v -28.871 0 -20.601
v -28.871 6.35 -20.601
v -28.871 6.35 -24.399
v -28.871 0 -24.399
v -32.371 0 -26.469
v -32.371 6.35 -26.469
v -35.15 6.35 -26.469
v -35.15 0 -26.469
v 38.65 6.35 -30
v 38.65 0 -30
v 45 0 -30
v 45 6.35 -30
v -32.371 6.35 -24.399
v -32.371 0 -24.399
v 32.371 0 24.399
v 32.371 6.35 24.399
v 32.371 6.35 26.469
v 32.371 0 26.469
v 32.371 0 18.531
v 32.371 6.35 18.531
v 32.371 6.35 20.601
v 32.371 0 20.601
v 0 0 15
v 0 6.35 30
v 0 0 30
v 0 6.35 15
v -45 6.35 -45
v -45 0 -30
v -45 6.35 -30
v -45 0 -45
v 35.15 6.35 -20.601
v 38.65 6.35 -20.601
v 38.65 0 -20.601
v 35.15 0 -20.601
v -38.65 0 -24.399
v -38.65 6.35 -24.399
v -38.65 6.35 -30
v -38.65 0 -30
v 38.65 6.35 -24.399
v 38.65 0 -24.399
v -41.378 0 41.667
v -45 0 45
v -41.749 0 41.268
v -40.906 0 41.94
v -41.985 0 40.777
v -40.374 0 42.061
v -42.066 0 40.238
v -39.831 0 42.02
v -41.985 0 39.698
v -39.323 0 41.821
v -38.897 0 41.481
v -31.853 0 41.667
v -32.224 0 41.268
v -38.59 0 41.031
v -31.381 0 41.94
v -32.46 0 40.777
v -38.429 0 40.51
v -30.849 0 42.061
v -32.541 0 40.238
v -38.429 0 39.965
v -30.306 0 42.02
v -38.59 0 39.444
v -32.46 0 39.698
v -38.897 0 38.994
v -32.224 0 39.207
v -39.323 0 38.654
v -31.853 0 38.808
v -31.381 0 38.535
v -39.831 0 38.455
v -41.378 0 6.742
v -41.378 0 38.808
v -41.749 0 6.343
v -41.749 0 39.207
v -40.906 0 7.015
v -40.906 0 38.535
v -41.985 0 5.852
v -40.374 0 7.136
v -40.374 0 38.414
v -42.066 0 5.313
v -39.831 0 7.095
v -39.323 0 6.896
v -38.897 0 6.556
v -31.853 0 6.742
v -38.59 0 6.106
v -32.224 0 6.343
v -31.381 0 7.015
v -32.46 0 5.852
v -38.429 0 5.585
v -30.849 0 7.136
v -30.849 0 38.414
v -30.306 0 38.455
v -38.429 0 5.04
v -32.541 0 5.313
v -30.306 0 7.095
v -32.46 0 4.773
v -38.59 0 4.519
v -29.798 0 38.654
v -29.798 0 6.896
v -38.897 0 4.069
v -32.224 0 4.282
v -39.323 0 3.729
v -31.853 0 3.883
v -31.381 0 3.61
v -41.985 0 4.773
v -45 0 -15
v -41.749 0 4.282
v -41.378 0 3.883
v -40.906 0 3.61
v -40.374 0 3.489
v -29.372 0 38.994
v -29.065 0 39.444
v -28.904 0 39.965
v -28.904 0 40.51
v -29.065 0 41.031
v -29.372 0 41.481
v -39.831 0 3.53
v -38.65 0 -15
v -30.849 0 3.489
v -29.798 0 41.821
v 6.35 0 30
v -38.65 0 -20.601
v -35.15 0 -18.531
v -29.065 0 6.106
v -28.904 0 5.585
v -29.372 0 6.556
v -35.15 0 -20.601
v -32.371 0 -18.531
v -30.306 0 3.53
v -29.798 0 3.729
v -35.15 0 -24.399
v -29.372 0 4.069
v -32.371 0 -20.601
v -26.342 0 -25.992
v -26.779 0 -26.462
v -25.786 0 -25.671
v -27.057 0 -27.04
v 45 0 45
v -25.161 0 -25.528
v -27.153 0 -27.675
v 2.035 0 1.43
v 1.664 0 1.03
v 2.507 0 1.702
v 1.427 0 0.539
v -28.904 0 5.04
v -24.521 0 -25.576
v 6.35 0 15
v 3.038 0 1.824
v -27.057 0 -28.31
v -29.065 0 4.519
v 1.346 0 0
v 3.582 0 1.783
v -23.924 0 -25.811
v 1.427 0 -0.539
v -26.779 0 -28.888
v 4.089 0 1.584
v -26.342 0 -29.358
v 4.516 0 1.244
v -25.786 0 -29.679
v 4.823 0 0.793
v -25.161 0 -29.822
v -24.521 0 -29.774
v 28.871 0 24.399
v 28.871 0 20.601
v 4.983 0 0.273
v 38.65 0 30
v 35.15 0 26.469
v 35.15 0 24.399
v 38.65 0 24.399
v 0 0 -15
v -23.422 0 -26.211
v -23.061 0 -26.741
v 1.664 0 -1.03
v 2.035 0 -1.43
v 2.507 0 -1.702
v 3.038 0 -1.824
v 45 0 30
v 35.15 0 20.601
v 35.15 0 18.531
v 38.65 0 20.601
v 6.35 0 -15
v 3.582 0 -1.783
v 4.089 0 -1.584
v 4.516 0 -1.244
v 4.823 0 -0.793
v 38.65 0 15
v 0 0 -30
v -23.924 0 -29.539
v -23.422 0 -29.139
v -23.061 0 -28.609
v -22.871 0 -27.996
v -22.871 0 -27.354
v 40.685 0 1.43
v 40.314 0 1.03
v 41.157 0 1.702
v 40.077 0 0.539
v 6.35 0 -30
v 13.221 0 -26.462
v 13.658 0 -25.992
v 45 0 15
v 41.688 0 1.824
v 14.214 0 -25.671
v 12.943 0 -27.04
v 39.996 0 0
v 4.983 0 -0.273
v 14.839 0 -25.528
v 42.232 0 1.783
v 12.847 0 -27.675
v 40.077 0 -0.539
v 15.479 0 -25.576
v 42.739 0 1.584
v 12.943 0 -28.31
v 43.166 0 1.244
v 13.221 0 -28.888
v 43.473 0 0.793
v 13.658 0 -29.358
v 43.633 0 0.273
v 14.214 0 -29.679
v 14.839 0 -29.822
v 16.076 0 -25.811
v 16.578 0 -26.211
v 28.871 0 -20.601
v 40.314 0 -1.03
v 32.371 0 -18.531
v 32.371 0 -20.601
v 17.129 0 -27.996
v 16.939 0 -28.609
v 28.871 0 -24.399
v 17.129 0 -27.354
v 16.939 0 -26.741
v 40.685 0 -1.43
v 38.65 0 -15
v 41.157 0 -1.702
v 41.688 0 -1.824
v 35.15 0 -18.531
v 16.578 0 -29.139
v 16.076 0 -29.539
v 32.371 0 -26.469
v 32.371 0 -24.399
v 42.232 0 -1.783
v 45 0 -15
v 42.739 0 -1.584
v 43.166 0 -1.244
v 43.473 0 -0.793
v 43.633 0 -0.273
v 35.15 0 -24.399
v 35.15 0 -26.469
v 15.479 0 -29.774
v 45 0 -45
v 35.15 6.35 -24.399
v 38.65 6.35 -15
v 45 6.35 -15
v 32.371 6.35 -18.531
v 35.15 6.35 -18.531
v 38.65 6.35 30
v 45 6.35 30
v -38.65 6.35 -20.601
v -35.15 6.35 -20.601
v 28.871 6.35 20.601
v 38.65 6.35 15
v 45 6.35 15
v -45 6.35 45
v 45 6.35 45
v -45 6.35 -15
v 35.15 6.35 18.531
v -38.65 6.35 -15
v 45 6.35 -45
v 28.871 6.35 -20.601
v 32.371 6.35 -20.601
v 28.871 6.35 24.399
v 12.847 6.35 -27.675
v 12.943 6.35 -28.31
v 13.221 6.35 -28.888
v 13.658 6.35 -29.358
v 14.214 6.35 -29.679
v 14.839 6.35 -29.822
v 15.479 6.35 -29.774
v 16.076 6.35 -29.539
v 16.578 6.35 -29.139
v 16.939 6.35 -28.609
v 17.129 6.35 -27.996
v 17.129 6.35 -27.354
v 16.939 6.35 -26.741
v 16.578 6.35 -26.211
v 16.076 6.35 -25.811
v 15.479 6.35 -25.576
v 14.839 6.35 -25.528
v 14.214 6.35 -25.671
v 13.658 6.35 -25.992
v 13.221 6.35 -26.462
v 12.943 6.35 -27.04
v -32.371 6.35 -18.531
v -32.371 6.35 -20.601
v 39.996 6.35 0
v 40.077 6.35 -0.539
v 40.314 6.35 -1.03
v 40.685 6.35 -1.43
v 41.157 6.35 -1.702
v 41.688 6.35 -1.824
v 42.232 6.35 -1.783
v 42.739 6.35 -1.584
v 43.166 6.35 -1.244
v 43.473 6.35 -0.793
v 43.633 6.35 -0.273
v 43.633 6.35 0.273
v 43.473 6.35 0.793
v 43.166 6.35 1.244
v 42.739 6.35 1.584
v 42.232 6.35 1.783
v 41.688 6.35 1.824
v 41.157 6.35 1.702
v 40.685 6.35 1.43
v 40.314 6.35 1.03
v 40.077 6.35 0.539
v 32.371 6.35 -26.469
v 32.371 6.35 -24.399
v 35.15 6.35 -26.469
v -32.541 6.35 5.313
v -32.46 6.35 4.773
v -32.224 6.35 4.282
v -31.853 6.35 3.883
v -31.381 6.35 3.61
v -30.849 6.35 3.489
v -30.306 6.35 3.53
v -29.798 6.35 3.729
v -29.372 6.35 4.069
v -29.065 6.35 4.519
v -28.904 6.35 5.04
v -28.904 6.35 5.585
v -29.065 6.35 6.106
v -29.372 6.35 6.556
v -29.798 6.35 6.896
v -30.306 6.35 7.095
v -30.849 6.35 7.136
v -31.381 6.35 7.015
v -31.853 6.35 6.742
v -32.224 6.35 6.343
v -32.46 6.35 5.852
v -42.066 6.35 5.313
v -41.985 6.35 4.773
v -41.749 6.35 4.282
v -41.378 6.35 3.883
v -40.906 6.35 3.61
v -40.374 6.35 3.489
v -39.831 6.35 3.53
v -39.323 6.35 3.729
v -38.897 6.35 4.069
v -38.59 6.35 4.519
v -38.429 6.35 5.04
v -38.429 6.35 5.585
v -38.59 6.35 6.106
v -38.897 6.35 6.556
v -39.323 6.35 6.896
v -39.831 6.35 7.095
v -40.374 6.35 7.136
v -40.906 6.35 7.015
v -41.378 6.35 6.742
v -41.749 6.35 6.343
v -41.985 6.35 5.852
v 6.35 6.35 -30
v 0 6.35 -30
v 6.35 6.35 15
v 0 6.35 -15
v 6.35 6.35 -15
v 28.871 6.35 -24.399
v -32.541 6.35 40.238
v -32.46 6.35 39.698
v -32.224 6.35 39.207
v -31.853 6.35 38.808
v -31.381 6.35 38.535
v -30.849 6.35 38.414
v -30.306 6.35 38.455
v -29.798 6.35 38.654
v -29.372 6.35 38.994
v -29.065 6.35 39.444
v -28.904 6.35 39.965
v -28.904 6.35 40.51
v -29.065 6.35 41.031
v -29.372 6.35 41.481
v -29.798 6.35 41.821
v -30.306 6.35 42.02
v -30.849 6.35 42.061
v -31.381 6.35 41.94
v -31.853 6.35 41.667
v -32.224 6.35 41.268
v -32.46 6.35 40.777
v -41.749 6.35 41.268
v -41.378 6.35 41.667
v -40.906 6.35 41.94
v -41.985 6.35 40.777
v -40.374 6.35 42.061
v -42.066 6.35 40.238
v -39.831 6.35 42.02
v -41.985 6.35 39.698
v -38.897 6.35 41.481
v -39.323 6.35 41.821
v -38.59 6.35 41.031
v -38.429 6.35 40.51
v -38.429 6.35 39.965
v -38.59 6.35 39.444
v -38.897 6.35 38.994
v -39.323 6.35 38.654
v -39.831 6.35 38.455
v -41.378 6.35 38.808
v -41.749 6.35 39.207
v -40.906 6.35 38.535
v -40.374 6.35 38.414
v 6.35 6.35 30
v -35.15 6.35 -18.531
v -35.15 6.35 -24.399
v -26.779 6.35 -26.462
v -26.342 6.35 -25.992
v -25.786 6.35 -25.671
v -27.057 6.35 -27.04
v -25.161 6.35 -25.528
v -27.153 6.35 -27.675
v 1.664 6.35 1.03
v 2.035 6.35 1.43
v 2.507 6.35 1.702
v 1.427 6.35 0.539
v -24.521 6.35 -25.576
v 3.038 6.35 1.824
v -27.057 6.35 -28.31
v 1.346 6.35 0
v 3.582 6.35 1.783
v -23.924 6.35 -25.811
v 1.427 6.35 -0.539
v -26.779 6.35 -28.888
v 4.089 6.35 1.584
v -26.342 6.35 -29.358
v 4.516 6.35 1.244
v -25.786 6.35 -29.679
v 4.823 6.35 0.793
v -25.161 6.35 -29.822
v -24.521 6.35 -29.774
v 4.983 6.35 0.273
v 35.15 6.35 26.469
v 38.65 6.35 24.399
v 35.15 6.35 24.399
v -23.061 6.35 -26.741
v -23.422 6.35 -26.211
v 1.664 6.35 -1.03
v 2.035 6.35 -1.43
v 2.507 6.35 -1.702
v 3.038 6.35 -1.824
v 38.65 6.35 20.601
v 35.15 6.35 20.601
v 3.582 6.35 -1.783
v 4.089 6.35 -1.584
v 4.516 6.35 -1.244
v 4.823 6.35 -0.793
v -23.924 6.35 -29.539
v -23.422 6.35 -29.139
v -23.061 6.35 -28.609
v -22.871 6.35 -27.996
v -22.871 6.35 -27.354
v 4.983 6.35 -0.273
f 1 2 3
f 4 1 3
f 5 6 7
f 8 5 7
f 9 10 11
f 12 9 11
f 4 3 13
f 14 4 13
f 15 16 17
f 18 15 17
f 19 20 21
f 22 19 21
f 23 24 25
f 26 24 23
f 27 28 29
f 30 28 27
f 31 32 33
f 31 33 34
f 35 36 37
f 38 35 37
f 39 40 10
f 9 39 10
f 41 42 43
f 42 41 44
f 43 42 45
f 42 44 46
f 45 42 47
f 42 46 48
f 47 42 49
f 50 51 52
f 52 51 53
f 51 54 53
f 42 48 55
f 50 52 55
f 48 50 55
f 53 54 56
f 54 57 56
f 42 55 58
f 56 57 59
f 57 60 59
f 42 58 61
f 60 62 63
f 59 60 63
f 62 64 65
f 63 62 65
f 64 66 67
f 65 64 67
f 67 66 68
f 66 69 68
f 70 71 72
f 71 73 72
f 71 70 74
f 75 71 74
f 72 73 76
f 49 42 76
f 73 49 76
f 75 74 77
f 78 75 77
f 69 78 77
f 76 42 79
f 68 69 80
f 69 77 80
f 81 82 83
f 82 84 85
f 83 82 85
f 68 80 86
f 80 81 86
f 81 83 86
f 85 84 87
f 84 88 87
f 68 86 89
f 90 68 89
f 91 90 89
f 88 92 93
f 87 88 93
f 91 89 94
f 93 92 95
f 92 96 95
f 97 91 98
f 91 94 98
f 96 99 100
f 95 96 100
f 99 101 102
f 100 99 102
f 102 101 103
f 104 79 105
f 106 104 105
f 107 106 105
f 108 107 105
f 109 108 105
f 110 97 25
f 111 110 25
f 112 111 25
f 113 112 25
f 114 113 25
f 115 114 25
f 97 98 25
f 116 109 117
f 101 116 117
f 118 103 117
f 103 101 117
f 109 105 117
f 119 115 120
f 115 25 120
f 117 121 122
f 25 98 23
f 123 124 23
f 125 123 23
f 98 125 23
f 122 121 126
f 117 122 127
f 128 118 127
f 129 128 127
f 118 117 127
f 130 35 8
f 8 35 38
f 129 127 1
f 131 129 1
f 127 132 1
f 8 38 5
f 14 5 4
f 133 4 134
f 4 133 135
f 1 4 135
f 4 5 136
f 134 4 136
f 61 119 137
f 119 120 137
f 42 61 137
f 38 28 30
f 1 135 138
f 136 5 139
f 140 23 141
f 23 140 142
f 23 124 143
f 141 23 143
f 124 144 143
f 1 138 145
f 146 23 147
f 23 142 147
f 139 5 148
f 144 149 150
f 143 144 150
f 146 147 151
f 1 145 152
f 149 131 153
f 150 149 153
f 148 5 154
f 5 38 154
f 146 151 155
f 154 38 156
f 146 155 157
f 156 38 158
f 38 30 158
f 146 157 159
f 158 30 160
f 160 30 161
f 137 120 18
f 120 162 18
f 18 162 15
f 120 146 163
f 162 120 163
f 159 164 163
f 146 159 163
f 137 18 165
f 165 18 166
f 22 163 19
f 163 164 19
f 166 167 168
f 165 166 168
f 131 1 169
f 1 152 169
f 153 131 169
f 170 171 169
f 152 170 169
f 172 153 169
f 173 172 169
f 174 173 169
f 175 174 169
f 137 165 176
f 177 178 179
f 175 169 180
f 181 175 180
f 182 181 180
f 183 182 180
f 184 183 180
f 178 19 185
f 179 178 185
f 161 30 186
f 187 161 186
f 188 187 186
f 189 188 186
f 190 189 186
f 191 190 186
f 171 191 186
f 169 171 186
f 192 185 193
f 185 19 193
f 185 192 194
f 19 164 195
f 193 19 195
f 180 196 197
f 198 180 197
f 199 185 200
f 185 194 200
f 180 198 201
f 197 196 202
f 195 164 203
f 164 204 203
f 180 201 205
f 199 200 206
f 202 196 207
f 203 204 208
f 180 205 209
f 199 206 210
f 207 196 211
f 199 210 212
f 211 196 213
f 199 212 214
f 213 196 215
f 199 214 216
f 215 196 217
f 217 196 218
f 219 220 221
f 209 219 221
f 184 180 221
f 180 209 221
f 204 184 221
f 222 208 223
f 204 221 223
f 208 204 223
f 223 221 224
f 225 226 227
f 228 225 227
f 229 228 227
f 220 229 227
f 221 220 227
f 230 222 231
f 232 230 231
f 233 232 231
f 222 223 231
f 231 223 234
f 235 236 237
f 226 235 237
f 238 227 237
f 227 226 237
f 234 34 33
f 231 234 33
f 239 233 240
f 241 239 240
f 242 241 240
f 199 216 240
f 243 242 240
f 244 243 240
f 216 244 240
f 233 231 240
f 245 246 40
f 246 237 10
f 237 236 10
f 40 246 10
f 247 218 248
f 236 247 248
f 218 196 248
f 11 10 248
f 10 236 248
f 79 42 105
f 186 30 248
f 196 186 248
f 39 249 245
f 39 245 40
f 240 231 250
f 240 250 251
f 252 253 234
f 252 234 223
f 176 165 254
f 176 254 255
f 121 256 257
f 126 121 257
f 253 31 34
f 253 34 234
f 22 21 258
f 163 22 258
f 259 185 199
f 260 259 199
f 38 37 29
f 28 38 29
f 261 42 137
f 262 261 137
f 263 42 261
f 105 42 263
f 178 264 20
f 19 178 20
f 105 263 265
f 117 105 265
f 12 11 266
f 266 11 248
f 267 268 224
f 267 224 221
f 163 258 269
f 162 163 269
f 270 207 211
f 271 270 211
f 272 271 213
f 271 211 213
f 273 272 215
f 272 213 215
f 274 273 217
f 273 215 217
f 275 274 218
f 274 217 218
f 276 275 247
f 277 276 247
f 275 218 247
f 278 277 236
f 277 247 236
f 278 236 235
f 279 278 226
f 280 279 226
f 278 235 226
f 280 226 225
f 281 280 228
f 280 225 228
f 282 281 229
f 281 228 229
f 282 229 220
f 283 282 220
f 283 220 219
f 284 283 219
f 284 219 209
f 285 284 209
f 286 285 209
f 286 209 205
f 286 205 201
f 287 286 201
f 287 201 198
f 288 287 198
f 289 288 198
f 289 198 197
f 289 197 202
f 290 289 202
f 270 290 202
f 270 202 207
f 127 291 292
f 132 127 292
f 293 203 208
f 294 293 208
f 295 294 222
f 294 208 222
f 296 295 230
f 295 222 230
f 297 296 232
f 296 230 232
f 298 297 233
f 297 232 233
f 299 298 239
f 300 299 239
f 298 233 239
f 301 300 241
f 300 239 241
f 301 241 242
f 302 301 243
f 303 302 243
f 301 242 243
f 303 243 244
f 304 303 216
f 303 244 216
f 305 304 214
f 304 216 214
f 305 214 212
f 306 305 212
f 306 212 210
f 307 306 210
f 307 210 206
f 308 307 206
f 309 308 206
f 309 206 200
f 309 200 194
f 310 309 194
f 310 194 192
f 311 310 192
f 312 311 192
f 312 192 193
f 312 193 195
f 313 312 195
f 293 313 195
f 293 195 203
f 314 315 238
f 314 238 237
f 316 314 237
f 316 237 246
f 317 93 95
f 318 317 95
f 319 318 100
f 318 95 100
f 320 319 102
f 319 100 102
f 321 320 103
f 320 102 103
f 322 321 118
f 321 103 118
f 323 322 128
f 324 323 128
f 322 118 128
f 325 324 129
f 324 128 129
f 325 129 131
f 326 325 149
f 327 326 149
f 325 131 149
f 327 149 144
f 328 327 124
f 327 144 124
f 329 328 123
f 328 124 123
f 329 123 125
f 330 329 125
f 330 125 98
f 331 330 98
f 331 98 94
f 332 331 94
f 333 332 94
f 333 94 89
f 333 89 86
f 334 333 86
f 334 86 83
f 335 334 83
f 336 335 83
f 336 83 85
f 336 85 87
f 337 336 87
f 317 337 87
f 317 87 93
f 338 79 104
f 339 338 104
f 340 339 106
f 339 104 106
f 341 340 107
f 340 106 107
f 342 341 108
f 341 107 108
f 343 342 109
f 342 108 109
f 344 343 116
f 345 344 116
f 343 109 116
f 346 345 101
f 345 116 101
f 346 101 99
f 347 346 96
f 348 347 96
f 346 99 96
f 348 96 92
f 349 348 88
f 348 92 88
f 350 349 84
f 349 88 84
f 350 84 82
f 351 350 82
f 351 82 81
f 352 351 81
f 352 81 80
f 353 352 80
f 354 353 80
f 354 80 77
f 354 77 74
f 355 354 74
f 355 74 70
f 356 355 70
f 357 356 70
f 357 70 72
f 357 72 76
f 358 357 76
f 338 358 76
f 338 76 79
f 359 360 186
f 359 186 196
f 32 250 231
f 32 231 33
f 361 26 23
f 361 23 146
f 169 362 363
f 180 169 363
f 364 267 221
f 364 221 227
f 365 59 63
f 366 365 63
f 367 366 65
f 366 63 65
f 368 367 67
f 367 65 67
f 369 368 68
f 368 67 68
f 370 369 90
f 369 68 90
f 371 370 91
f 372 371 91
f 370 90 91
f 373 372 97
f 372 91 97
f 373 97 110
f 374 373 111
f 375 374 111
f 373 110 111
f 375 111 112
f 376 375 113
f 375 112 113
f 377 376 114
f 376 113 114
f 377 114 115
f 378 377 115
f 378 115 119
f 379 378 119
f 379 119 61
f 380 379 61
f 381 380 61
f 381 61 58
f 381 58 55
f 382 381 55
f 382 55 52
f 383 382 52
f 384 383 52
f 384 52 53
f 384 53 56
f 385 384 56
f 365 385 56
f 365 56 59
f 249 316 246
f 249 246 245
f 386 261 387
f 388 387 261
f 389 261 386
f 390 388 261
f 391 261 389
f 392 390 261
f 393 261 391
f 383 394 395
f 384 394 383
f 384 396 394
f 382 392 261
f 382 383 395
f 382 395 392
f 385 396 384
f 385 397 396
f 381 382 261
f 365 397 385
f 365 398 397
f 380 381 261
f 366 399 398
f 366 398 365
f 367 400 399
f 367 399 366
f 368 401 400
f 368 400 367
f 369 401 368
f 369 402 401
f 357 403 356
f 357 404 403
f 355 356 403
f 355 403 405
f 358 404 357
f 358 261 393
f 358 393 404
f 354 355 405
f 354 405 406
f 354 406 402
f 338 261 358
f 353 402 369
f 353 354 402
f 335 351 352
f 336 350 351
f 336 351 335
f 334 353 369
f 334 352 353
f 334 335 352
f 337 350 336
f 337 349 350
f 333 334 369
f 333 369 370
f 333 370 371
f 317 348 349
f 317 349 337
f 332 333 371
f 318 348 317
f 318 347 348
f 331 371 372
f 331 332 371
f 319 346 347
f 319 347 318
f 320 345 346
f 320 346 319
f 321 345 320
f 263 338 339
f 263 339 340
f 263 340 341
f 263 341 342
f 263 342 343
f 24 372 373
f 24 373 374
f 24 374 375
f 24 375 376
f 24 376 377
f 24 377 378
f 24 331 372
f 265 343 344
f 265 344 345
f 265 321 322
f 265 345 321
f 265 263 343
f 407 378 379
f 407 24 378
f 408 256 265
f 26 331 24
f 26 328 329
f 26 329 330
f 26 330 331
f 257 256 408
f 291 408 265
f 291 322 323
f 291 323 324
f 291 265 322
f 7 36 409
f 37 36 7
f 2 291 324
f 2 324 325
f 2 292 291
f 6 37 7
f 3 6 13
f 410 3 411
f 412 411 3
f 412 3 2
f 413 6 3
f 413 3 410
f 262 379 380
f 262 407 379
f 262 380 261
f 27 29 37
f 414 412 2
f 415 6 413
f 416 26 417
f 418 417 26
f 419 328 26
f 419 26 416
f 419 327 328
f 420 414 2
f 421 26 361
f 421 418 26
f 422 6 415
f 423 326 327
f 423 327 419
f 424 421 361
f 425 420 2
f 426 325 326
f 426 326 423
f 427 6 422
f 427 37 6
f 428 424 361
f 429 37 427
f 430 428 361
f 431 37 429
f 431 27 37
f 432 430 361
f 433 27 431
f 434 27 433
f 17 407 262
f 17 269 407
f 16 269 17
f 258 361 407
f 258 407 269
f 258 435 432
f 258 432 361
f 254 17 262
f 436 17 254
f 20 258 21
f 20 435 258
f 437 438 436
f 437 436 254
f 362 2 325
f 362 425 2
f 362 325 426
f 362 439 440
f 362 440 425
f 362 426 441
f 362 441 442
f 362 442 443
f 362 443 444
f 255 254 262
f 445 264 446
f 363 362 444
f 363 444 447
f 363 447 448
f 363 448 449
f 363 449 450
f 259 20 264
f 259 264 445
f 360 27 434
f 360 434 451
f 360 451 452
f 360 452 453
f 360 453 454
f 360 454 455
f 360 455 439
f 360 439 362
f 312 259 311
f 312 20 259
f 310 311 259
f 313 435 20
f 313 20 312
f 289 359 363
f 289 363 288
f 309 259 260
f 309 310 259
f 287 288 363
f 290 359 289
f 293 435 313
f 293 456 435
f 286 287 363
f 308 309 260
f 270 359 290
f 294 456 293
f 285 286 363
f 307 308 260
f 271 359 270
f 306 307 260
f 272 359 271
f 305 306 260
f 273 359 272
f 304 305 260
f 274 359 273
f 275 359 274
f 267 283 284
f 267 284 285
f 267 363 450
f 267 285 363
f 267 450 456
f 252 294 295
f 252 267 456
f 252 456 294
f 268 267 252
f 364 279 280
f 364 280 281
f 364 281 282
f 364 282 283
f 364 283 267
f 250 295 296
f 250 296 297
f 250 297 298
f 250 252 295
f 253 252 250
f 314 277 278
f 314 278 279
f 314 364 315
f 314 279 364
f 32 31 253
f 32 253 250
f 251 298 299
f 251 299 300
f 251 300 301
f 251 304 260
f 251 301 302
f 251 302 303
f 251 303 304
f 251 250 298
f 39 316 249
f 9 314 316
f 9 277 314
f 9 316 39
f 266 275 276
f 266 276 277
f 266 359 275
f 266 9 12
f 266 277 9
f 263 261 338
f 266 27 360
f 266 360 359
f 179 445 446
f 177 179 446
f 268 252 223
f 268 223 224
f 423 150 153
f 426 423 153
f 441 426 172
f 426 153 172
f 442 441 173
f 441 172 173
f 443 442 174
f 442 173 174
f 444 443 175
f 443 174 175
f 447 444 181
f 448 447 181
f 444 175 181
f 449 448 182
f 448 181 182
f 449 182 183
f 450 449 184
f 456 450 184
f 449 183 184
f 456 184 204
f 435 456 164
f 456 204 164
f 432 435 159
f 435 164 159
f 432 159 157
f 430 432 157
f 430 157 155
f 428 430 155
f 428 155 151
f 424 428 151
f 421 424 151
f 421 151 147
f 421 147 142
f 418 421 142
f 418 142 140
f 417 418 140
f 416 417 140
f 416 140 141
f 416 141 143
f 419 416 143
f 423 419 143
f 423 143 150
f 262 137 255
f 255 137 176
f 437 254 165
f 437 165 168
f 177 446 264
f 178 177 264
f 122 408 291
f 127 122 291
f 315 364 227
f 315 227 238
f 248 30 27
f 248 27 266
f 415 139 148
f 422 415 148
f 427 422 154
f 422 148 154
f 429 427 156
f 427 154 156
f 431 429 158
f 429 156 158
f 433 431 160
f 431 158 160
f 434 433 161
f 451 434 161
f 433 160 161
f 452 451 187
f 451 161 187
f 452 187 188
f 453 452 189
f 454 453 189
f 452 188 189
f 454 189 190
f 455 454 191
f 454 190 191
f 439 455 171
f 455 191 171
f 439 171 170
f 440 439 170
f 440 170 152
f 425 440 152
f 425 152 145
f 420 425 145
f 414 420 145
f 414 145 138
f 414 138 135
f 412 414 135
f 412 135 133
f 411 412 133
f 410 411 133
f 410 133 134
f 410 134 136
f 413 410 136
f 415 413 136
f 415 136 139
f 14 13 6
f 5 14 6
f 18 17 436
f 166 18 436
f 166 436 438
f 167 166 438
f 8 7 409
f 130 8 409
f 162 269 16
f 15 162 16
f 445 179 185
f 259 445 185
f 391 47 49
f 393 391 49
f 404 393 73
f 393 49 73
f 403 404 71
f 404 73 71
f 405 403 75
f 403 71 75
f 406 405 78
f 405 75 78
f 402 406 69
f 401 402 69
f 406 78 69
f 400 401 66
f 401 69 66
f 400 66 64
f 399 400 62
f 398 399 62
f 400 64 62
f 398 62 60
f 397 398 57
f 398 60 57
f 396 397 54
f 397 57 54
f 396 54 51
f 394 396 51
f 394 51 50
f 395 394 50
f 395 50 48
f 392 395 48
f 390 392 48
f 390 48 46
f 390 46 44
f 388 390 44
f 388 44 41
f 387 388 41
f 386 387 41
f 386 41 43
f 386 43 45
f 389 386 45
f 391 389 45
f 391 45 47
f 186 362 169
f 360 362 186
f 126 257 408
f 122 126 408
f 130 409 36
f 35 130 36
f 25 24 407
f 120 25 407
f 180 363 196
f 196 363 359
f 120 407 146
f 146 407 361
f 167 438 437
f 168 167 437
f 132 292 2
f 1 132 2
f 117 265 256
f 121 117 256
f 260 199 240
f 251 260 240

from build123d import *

# Parameters (mm, degrees)
SKETCH1_W             = 90
SKETCH1_H             = 90
BOSS_EXTRUDE1_DEPTH   = 6.35
F_6_CLEARANCE_HOLE1_D = 3.6576
LPATTERN1_COUNT       = 2
LPATTERN1_PITCH       = 34.925
LPATTERN1_COUNT_DIR2  = 2
LPATTERN1_PITCH_DIR2  = 9.525
F_8_CLEARANCE_HOLE1_D = 4.3053
SKETCH7_W             = 6.35
SKETCH7_H             = 15
CUT_EXTRUDE1_DEPTH    = 64.95562915
F_6_CLEARANCE_HOLE2_D = 3.6576
CUT_EXTRUDE2_DEPTH    = 64.95562915
CUT_EXTRUDE3_DEPTH    = 64.95562915


with BuildPart() as part:
    # Sketch1 → Boss-Extrude1 (new body)
    with BuildSketch(Plane(origin=(0, 0, 0), x_dir=(1, 0, 0), z_dir=(0, 1, 0))):
        Rectangle(SKETCH1_W, SKETCH1_H)
    extrude(amount=BOSS_EXTRUDE1_DEPTH)

    # #6 Clearance Hole1 (through all)
    with Locations(Plane(origin=(0, 6.35, 0), x_dir=(1, 0, 0), z_dir=(0, 1, 0))):
        with Locations((-40.2375, -40.2375)):
            f_6_clearance_hole1 = Hole(F_6_CLEARANCE_HOLE1_D / 2)

    # LPattern1: 6 Clearance Hole1 2 × 2
    with Locations(*[(j * LPATTERN1_PITCH_DIR2, 0, -i * LPATTERN1_PITCH) for i in range(LPATTERN1_COUNT) for j in range(LPATTERN1_COUNT_DIR2) if (i, j) != (0, 0)]):
        add(f_6_clearance_hole1, mode=Mode.SUBTRACT)

    # #8 Clearance Hole1 (through all)
    with Locations(Plane(origin=(0, 6.35, 0), x_dir=(1, 0, 0), z_dir=(0, 1, 0))):
        with Locations((-25, 27.675), (15, 27.675)):
            Hole(F_8_CLEARANCE_HOLE1_D / 2)

    # Sketch7 → Cut-Extrude1 (cut, through all)
    with BuildSketch(Plane(origin=(0, 6.35, 0), x_dir=(1, 0, 0), z_dir=(0, 1, 0))):
        with Locations((3.175, -22.5)):
            Rectangle(SKETCH7_W, SKETCH7_H)
        with Locations((3.175, 22.5)):
            Rectangle(SKETCH7_W, SKETCH7_H)
        with Locations((41.825, -22.5)):
            Rectangle(SKETCH7_W, SKETCH7_H)
        with Locations((41.825, 22.5)):
            Rectangle(SKETCH7_W, SKETCH7_H)
    extrude(amount=-CUT_EXTRUDE1_DEPTH, mode=Mode.SUBTRACT)

    # #6 Clearance Hole2 (through all)
    with Locations(Plane(origin=(0, 6.35, 0), x_dir=(1, 0, 0), z_dir=(0, 1, 0))):
        with Locations((41.825, 0), (3.175, 0)):
            Hole(F_6_CLEARANCE_HOLE2_D / 2)

    # Sketch10 → Cut-Extrude2 (cut, through all)
    with BuildSketch(Plane(origin=(0, 6.35, 0), x_dir=(1, 0, 0), z_dir=(0, 1, 0))):
        Polygon((28.871, -20.60135), (28.871, -24.39865), (32.3714375, -24.39865), (32.3714375, -26.46875), (35.1495625, -26.46875), (35.1495625, -24.39865), (38.65, -24.39865), (38.65, -20.60135), (35.1495625, -20.60135), (35.1495625, -18.53125), (32.3714375, -18.53125), (32.3714375, -20.60135), align=None)
        Polygon((38.65, 24.39865), (38.65, 20.60135), (35.1495625, 20.60135), (35.1495625, 18.53125), (32.3714375, 18.53125), (32.3714375, 20.60135), (28.871, 20.60135), (28.871, 24.39865), (32.3714375, 24.39865), (32.3714375, 26.46875), (35.1495625, 26.46875), (35.1495625, 24.39865), align=None)
    extrude(amount=-CUT_EXTRUDE2_DEPTH, mode=Mode.SUBTRACT)

    # Sketch11 → Cut-Extrude3 (cut, through all)
    with BuildSketch(Plane(origin=(0, 6.35, 0), x_dir=(1, 0, 0), z_dir=(0, 1, 0))):
        Polygon((-45, 15), (-38.65, 15), (-38.65, 20.60135), (-35.1495625, 20.60135), (-35.1495625, 18.53125), (-32.3714375, 18.53125), (-32.3714375, 20.60135), (-28.871, 20.60135), (-28.871, 24.39865), (-32.3714375, 24.39865), (-32.3714375, 26.46875), (-35.1495625, 26.46875), (-35.1495625, 24.39865), (-38.65, 24.39865), (-38.65, 30), (-45, 30), align=None)
    extrude(amount=-CUT_EXTRUDE3_DEPTH, mode=Mode.SUBTRACT)


solid = part.part
